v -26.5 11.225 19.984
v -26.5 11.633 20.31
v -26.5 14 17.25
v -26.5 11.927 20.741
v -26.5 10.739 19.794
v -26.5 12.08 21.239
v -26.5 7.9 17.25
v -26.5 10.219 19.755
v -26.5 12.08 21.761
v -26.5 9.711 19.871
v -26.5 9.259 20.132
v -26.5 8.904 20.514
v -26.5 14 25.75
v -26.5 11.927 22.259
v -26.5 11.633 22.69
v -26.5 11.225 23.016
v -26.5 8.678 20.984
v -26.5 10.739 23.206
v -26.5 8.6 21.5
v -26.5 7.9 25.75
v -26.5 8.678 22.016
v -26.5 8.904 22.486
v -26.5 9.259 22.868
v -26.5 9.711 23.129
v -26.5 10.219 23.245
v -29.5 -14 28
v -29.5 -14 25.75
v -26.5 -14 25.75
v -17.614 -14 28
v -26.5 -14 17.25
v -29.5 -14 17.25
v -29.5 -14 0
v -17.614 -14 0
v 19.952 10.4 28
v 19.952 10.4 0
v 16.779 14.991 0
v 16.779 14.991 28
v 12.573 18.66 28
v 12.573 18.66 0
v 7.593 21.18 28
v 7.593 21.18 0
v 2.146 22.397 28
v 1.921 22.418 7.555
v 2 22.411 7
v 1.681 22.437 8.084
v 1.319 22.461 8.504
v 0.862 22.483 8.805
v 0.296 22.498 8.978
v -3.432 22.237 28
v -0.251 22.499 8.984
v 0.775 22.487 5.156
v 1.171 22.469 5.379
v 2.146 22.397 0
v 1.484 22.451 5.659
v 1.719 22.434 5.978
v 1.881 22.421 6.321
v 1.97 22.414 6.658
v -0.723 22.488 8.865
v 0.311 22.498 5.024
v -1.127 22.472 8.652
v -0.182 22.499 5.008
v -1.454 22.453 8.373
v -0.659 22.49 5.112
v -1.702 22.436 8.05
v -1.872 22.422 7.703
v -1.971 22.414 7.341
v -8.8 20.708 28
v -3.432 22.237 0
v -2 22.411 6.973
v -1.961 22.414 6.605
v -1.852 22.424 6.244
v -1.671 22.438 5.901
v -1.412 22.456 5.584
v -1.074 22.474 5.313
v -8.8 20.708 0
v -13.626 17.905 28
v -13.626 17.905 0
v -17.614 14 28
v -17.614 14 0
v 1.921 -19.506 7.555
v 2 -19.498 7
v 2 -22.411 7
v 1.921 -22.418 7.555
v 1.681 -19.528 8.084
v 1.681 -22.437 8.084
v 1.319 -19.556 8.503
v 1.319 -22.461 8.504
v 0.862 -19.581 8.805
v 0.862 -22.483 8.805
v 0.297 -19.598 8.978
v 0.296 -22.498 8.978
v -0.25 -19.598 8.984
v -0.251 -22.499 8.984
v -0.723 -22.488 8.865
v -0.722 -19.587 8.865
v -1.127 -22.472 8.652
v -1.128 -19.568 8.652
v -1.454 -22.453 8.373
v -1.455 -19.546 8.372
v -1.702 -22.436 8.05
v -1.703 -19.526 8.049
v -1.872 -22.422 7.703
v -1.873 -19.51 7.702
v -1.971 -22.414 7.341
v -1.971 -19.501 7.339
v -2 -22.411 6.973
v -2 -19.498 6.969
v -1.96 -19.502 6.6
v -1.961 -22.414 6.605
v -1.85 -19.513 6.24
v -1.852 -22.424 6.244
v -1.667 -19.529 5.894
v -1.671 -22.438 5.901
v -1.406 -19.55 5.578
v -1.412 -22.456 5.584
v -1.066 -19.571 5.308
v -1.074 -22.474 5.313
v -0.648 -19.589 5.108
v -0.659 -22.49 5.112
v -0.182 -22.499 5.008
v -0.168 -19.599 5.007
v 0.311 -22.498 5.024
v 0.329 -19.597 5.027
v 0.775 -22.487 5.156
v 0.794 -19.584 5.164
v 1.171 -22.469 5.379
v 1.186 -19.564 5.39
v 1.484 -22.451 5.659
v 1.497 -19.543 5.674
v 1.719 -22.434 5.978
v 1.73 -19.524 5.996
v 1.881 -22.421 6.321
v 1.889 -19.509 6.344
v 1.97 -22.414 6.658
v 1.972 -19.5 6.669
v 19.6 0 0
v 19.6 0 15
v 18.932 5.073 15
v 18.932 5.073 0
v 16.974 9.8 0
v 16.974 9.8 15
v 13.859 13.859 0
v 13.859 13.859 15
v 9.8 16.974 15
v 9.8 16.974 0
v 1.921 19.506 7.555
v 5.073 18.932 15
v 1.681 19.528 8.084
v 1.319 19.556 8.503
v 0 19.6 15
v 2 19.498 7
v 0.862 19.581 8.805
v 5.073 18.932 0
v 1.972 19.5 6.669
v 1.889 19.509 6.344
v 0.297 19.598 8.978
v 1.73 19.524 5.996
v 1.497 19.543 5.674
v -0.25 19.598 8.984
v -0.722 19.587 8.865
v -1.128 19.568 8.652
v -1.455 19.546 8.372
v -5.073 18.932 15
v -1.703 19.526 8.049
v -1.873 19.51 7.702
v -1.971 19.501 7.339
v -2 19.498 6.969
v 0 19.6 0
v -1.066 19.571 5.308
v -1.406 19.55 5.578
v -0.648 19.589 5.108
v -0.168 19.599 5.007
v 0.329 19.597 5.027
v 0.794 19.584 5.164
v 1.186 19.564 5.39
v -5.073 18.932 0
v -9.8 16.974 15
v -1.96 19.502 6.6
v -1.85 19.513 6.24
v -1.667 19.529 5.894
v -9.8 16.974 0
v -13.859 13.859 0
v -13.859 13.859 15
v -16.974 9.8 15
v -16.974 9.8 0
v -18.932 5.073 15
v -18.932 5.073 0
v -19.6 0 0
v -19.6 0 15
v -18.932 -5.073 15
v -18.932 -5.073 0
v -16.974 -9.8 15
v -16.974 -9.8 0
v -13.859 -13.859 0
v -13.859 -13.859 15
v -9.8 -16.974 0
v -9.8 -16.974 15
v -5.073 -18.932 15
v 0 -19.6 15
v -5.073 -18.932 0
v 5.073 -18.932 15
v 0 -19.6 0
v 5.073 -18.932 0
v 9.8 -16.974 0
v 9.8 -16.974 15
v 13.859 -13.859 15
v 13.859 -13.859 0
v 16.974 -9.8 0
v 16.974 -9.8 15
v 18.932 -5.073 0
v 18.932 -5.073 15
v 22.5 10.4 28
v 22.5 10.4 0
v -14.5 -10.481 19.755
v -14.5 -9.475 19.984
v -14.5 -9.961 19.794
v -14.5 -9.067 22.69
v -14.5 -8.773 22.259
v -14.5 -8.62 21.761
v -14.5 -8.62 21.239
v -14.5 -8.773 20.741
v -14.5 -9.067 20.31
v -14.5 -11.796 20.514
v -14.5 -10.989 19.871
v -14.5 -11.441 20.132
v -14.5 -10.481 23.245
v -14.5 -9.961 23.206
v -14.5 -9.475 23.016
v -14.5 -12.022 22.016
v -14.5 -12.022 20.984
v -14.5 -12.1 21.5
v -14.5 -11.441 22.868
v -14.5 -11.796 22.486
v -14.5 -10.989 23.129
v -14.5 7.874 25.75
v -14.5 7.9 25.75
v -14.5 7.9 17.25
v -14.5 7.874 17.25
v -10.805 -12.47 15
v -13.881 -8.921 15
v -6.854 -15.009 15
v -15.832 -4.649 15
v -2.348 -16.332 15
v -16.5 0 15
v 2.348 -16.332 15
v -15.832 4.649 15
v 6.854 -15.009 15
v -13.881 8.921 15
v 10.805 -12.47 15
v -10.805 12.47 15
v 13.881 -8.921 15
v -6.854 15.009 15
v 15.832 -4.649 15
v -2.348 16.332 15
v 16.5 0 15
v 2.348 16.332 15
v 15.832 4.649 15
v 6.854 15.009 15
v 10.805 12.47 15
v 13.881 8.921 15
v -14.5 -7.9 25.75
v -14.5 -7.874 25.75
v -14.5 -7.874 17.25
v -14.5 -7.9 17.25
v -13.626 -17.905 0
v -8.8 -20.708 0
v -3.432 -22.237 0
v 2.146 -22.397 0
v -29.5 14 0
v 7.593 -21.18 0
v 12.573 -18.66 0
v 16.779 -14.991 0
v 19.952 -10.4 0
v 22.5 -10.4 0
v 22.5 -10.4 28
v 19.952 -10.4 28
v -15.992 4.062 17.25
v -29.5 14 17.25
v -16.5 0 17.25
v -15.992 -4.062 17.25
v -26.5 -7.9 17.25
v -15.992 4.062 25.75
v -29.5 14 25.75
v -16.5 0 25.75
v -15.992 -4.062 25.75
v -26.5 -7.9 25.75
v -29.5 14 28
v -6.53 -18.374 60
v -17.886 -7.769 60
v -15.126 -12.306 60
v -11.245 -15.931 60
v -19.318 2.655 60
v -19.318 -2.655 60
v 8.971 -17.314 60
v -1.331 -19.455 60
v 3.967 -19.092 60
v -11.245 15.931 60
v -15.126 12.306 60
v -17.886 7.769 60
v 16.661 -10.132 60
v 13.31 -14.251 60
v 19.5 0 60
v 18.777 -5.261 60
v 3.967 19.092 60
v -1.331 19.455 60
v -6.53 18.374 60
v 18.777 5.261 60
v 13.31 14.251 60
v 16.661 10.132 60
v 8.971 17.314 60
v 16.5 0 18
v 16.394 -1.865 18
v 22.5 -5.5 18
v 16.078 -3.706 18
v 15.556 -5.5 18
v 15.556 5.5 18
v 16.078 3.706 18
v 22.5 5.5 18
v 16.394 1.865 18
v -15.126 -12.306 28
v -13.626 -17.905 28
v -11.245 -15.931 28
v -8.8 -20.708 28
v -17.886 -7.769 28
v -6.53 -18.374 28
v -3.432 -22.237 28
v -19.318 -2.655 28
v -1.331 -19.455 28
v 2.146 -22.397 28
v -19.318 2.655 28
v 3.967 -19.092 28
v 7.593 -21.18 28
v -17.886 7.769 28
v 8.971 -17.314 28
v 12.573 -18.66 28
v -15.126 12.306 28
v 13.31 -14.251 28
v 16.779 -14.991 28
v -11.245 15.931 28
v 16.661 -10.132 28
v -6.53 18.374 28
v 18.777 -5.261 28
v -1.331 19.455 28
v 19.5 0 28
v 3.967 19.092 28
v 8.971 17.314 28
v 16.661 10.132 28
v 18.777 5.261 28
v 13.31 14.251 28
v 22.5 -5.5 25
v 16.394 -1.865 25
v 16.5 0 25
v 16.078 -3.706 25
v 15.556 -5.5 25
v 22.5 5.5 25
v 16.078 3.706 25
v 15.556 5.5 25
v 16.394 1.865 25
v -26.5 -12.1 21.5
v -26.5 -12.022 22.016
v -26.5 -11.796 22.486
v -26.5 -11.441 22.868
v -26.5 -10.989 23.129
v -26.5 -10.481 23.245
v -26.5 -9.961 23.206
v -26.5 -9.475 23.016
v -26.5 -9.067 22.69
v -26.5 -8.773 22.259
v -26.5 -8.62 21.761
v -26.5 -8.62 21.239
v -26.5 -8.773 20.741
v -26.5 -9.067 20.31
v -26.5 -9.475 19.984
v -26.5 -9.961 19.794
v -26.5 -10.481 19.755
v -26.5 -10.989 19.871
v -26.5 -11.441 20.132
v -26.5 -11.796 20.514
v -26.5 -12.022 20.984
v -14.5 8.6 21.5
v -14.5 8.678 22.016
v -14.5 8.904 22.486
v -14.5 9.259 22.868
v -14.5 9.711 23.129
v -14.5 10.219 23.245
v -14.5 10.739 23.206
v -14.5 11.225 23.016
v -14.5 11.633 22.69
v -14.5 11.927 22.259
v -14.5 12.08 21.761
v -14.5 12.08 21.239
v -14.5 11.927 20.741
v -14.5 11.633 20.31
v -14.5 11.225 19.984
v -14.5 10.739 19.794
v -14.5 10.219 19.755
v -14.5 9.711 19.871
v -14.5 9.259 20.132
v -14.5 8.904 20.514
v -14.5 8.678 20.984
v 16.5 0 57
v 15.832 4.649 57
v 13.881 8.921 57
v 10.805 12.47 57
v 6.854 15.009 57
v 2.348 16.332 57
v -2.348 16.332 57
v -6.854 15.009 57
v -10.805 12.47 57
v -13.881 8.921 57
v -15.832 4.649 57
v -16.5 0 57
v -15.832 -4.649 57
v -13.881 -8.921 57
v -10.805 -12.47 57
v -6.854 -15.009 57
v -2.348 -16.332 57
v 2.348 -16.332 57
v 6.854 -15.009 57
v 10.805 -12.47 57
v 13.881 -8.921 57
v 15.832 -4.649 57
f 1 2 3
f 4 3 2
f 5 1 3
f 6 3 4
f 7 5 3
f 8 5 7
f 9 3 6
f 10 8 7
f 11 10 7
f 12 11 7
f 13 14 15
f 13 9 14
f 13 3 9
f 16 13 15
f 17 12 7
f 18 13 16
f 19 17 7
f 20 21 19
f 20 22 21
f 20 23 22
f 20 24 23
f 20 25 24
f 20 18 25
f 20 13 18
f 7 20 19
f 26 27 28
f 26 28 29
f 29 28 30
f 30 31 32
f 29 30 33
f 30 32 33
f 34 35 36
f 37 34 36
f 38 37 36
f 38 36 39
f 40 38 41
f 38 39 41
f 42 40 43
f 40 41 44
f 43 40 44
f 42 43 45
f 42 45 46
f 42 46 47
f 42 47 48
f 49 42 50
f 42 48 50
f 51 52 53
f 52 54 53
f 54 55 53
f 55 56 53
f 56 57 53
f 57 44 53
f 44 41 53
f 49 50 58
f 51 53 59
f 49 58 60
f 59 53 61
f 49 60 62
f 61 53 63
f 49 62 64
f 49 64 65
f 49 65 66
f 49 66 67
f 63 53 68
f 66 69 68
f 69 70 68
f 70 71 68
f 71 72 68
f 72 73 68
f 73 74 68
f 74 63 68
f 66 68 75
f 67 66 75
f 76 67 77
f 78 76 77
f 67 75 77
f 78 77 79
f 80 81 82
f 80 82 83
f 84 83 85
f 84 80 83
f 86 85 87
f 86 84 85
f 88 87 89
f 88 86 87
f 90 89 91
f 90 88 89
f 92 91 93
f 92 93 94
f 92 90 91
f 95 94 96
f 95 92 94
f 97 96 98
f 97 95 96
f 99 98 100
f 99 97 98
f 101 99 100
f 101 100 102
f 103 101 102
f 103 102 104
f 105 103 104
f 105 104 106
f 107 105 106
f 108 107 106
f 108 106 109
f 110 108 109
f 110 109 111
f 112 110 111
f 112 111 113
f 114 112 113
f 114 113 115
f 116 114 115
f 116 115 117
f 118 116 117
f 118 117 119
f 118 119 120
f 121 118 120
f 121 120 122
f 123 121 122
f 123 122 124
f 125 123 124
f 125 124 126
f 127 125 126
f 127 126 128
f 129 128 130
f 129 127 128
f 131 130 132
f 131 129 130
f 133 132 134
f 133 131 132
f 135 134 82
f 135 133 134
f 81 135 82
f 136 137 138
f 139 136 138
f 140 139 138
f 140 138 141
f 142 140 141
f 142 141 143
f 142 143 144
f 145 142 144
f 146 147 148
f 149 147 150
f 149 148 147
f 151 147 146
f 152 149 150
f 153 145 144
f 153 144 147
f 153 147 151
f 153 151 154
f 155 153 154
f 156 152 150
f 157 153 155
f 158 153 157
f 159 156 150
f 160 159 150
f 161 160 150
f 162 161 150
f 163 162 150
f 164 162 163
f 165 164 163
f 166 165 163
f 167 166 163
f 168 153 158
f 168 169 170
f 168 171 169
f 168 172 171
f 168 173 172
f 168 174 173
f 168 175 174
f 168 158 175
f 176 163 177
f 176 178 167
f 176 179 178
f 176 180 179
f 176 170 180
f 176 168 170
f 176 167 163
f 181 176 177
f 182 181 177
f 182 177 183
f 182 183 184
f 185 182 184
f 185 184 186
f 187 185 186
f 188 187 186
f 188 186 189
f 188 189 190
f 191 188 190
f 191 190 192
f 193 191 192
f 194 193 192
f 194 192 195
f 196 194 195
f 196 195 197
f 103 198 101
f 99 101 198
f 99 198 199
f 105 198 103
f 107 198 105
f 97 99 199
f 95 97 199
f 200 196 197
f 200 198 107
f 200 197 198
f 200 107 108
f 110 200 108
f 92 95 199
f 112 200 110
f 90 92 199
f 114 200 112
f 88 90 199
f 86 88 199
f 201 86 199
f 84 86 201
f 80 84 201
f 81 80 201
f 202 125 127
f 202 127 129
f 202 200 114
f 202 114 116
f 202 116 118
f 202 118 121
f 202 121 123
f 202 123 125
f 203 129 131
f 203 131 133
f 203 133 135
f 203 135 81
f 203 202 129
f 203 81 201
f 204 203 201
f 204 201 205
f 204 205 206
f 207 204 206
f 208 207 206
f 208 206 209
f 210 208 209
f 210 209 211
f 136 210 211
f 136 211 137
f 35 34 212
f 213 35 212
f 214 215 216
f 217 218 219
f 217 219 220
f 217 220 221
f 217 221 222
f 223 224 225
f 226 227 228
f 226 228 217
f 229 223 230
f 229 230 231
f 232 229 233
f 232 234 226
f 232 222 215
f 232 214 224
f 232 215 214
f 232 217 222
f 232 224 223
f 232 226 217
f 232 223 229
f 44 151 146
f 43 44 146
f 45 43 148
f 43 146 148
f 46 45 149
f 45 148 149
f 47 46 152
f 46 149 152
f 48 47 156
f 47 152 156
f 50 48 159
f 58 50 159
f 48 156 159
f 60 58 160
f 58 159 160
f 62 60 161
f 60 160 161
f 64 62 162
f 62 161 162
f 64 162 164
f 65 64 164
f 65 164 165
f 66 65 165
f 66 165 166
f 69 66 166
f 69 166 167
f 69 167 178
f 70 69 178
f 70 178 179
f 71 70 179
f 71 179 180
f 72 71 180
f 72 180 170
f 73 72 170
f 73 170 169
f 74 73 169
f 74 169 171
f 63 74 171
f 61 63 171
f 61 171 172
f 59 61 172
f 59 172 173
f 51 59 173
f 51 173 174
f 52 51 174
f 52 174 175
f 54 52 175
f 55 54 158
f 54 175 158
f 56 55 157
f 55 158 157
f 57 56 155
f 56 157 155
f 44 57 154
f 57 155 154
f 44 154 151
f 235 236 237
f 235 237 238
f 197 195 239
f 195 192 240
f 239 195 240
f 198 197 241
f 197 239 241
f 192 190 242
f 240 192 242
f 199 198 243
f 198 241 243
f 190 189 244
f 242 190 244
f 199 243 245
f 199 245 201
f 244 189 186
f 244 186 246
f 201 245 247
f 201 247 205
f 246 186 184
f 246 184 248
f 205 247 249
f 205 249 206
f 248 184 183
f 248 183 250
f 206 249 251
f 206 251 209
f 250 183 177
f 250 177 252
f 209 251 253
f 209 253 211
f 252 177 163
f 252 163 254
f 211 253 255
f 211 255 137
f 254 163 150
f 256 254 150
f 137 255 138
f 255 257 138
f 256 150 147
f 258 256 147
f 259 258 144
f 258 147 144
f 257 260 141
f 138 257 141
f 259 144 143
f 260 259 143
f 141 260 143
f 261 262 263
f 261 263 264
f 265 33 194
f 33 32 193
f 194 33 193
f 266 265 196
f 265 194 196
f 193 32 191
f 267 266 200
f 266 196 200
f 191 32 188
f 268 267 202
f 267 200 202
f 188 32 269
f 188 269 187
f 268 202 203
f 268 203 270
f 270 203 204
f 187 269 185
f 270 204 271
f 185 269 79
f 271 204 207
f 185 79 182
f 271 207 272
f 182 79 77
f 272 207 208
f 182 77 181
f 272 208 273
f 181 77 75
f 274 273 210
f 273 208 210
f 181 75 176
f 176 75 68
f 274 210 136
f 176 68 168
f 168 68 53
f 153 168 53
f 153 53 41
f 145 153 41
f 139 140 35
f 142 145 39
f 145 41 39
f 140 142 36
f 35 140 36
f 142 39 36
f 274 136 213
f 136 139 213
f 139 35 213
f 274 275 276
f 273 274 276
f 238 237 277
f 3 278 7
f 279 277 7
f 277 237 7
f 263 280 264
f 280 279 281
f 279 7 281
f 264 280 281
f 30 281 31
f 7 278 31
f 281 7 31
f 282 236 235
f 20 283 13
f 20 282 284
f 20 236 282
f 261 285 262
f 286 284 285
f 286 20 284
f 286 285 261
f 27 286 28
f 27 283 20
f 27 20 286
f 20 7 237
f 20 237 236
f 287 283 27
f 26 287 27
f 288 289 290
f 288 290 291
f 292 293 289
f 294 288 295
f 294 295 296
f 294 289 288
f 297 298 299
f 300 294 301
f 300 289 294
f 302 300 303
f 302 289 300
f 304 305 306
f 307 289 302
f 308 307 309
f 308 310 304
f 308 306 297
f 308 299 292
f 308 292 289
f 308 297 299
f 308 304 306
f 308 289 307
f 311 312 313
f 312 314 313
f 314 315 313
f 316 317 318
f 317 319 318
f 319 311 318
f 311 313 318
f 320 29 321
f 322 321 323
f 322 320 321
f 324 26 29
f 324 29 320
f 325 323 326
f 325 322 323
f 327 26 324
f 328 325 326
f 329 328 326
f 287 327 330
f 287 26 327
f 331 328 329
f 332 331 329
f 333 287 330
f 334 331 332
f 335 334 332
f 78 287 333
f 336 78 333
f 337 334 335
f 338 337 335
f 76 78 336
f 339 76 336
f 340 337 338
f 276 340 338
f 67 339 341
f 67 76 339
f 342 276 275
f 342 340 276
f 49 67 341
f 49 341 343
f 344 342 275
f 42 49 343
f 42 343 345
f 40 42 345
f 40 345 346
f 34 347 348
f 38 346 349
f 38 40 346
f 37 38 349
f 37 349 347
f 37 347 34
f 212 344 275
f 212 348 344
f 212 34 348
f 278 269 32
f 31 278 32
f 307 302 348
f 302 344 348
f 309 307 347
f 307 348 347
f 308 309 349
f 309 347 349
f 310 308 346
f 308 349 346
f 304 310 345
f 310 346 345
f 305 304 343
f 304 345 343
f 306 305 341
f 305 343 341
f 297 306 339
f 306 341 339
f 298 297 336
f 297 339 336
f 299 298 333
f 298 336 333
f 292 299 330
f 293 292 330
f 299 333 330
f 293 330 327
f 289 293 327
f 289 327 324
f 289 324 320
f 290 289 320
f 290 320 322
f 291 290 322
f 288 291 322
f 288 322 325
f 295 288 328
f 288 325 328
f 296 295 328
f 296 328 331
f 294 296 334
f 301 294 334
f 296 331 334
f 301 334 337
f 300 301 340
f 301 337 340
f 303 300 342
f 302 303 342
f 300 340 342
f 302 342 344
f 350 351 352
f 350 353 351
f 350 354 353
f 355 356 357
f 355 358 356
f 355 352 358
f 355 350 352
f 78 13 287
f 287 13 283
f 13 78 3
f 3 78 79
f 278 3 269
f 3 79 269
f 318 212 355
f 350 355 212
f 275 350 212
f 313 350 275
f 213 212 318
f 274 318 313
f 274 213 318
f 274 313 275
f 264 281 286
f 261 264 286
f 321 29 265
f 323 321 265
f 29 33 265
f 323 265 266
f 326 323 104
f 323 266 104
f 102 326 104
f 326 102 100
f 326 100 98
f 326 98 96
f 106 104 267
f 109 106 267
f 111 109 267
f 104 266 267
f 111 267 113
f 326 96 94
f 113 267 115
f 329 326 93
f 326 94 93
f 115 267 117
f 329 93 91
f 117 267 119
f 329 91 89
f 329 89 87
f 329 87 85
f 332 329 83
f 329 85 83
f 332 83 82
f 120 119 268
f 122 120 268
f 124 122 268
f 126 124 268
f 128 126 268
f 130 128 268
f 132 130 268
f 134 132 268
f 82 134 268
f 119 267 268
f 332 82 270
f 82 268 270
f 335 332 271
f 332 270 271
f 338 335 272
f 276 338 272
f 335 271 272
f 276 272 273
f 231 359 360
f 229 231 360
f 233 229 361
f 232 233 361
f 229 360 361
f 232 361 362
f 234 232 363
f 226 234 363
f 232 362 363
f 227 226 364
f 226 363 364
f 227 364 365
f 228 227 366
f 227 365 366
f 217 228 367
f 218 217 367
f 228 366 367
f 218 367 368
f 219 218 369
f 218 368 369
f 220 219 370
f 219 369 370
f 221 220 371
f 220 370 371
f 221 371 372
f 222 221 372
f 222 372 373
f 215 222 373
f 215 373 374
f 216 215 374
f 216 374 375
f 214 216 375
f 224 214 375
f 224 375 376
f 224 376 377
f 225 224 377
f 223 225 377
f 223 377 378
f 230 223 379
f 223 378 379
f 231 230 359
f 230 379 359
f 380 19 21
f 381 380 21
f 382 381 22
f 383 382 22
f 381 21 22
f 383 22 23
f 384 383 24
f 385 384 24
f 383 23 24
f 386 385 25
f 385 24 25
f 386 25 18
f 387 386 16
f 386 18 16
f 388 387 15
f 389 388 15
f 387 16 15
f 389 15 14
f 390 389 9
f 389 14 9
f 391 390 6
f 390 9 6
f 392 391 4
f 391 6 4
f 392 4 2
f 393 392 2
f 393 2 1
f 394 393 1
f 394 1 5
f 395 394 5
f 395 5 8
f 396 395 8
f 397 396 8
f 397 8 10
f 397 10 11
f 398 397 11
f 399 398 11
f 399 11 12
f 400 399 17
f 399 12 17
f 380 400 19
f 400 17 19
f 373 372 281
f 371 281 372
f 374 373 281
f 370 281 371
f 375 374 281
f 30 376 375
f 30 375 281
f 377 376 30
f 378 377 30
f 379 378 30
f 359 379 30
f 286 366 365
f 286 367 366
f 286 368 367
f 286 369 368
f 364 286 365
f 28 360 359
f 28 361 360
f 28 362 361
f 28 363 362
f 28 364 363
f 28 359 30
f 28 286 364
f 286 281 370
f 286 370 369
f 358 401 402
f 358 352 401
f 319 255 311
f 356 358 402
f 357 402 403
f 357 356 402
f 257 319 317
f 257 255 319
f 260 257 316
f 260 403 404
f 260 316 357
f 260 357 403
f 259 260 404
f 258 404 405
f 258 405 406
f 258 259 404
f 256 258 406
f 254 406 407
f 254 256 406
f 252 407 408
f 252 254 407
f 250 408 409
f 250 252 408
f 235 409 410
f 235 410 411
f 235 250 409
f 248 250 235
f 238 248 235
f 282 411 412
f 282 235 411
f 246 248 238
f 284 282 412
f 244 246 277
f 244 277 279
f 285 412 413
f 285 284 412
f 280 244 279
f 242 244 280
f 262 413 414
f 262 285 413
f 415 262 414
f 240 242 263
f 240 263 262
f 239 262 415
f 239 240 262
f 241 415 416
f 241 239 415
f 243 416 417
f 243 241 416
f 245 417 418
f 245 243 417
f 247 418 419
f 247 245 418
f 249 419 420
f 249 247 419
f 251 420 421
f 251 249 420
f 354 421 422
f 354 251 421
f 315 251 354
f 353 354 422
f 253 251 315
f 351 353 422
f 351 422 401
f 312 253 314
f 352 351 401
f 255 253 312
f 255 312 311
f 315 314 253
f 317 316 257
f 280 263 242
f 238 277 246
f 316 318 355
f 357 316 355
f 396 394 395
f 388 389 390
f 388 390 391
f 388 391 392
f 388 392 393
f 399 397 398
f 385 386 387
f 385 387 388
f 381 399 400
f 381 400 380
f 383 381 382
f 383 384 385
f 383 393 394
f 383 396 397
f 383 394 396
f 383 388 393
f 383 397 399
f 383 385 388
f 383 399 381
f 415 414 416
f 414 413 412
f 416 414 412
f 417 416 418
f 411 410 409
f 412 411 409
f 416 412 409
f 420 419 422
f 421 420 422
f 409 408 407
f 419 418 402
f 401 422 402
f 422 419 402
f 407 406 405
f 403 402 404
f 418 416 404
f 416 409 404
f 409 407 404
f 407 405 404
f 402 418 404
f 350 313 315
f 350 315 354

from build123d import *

# Parameters (mm, degrees)
SKETCH_R        = 19.6
PAD_DEPTH       = 15
SKETCH001_R     = 16.5
PAD001_DEPTH    = 13
SKETCH002_W     = 11
SKETCH002_H     = 7
POCKET_DEPTH    = 10
SKETCH003_W     = 28
SKETCH003_H     = 8.5
POCKET001_DEPTH = 3
SKETCH004_R     = 1.75
SKETCH004_W     = 15.8
SKETCH004_H     = 8.5
POCKET002_DEPTH = 12
SKETCH006_R     = 2
HOLE_DEPTH      = 22.501
SKETCH007_R     = 2
HOLE001_DEPTH   = 22.501
SKETCH008_R     = 19.5
SKETCH008_R_2   = 16.5
PAD002_DEPTH    = 29
SKETCH009_R     = 19.5
PAD003_DEPTH    = 3


with BuildPart() as part:
    # Sketch → Pad (new body)
    with BuildSketch(Plane.XY):
        with BuildLine():
            Line((-29.5, 14), (-29.5, -14))
            Line((-29.5, -14), (-17.613915, -14))
            ThreePointArc((-17.613915, -14), (2.146366, -22.397391), (19.952193, -10.4))
            Line((19.952193, -10.4), (22.5, -10.4))
            Line((22.5, -10.4), (22.5, 10.4))
            Line((22.5, 10.4), (19.952193, 10.4))
            ThreePointArc((19.952193, 10.4), (2.146366, 22.397391), (-17.613915, 14))
            Line((-17.613915, 14), (-29.5, 14))
        make_face()
        Circle(SKETCH_R, mode=Mode.SUBTRACT)
    extrude(amount=PAD_DEPTH)

    # Sketch001 (on Face11 of Pad) → Pad001 (join)
    with BuildSketch(Plane.XY.offset(15)):
        with BuildLine():
            ThreePointArc((19.952193, 10.4), (2.146366, 22.397391), (-17.613915, 14))
            Line((-17.613915, 14), (-29.5, 14))
            Line((-29.5, 14), (-29.5, -14))
            Line((-29.5, -14), (-17.613915, -14))
            ThreePointArc((-17.613915, -14), (2.146366, -22.397391), (19.952193, -10.4))
            Line((22.5, -10.4), (19.952193, -10.4))
            Line((22.5, 10.4), (22.5, -10.4))
            Line((19.952193, 10.4), (22.5, 10.4))
        make_face()
        Circle(SKETCH001_R, mode=Mode.SUBTRACT)
    extrude(amount=PAD001_DEPTH)

    # Sketch002 (on Face10 of Pad001) → Pocket (cut)
    with BuildSketch(Plane.YZ.offset(22.5)):
        with Locations((0, 21.5)):
            Rectangle(SKETCH002_W, SKETCH002_H)
    extrude(amount=-POCKET_DEPTH, mode=Mode.SUBTRACT)

    # Sketch003 (on Face2 of Pocket) → Pocket001 (cut)
    with BuildSketch(Plane(origin=(-29.5, 0, 0), x_dir=(0, -1, 0), z_dir=(-1, 0, 0))):
        with Locations((0, 21.5)):
            Rectangle(SKETCH003_W, SKETCH003_H)
    extrude(amount=-POCKET001_DEPTH, mode=Mode.SUBTRACT)

    # Sketch004 (on Face12 of Pocket001) → Pocket002 (cut)
    with BuildSketch(Plane(origin=(-26.5, 0, 0), x_dir=(0, -1, 0), z_dir=(-1, 0, 0))):
        with Locations((10.35, 21.5)):
            Circle(SKETCH004_R)
        with Locations((-10.35, 21.5)):
            Circle(SKETCH004_R)
        with Locations((0, 21.5)):
            Rectangle(SKETCH004_W, SKETCH004_H)
    extrude(amount=-POCKET002_DEPTH, mode=Mode.SUBTRACT)

    # Sketch006 → Hole (cut, through all)
    with BuildSketch(Plane.XZ):
        with Locations((0, 7)):
            Circle(SKETCH006_R)
    extrude(amount=-HOLE_DEPTH, mode=Mode.SUBTRACT)

    # Sketch007 → Hole001 (cut, through all)
    with BuildSketch(Plane.XZ):
        with Locations((0, 7)):
            Circle(SKETCH007_R)
    extrude(amount=HOLE001_DEPTH, mode=Mode.SUBTRACT)

    # Sketch008 (on Face15 of Hole001) → Pad002 (join)
    with BuildSketch(Plane.XY.offset(28)):
        Circle(SKETCH008_R)
        Circle(SKETCH008_R_2, mode=Mode.SUBTRACT)
    extrude(amount=PAD002_DEPTH)

    # Sketch009 (on Face32 of Pad002) → Pad003 (join)
    with BuildSketch(Plane.XY.offset(57)):
        Circle(SKETCH009_R)
    extrude(amount=PAD003_DEPTH)


solid = part.part
